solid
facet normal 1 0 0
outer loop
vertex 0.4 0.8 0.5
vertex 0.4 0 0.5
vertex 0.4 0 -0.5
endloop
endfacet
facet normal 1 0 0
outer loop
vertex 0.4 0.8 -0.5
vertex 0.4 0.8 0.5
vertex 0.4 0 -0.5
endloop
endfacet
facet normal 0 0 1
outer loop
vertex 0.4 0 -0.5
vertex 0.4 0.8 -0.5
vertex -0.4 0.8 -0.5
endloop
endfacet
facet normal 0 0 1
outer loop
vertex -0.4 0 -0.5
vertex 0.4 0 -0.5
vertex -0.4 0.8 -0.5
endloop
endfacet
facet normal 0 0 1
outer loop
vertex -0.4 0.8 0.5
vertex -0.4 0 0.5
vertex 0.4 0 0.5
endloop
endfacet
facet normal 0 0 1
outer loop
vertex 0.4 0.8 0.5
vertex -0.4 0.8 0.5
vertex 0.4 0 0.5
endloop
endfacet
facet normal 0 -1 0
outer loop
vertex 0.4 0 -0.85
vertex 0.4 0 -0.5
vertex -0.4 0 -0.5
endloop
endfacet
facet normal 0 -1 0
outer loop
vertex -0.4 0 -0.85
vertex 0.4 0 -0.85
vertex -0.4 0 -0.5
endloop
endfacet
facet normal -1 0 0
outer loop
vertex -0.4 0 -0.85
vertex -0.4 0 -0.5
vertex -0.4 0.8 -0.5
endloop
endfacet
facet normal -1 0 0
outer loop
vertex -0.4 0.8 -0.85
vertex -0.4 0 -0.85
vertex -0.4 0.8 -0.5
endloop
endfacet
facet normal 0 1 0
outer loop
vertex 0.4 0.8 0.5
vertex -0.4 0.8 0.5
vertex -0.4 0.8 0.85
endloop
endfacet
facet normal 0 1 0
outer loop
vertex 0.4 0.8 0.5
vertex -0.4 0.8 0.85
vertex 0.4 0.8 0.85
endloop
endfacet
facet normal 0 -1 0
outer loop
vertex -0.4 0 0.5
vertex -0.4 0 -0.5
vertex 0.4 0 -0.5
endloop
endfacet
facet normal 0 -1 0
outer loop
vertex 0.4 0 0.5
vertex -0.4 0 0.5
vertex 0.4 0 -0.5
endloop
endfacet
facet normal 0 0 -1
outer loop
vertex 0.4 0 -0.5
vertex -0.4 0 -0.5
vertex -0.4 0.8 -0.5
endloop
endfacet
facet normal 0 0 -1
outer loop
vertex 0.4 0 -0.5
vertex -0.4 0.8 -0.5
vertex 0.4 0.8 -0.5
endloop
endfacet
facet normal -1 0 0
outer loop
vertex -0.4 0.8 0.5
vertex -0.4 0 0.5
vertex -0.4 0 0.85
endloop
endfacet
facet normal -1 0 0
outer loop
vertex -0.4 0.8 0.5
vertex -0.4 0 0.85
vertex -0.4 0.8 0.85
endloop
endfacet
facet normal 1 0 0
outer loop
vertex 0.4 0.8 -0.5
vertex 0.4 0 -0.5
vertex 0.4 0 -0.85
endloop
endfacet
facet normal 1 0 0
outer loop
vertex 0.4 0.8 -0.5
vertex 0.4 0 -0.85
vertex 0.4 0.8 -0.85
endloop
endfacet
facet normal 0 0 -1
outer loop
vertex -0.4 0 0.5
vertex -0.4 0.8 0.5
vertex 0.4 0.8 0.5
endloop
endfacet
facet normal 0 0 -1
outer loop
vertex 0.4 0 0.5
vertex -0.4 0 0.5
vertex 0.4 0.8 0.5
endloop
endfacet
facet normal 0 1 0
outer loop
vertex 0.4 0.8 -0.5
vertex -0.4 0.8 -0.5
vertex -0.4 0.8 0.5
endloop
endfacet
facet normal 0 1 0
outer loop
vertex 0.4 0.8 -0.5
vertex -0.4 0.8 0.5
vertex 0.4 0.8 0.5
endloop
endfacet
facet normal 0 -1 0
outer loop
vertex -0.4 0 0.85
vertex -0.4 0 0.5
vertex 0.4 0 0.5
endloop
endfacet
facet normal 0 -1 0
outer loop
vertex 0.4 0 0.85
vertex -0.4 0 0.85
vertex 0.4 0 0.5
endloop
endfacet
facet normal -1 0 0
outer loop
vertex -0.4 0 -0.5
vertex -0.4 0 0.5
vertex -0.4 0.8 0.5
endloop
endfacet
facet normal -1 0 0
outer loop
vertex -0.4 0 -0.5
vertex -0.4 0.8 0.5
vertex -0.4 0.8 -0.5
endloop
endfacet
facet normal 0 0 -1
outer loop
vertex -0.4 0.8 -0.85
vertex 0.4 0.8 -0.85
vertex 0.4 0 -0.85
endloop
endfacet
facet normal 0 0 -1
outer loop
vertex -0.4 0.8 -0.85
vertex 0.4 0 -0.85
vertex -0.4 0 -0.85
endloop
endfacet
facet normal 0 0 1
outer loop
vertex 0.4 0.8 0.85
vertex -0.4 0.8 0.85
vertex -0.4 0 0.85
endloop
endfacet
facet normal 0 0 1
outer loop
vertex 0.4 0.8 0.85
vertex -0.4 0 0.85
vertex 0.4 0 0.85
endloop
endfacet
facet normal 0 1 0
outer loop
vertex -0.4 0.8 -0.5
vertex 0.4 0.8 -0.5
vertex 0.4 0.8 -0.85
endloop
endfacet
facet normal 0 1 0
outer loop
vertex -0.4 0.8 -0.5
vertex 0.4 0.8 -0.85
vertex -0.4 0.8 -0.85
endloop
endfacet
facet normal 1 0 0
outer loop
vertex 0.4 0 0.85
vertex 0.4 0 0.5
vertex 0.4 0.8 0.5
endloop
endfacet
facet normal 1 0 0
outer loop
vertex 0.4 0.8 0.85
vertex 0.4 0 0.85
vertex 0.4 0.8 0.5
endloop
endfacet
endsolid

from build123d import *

# Parameters (mm, degrees)
SKETCH1_W  = 0.8
SKETCH1_H  = 1
MB_DEPTH   = 0.8
SKETCH2_W  = 0.8
SKETCH2_H  = 0.8
SB_L_DEPTH = 0.35
SKETCH3_W  = 0.8
SKETCH3_H  = 0.8
SB_R_DEPTH = 0.35


with BuildPart() as part:
    # Sketch1 → MB (new body)
    with BuildSketch(Plane(origin=(0, 0, 0), x_dir=(1, 0, 0), z_dir=(0, 1, 0))):
        Rectangle(SKETCH1_W, SKETCH1_H)
    extrude(amount=MB_DEPTH)


with BuildPart() as body_2:
    # Sketch2 → SB L (new body)
    with BuildSketch(Plane.XY.offset(0.5)):
        with Locations((0, 0.4)):
            Rectangle(SKETCH2_W, SKETCH2_H)
    extrude(amount=SB_L_DEPTH)


with BuildPart() as body_3:
    # Sketch3 → SB R (new body)
    with BuildSketch(Plane(origin=(0, 0, -0.5), x_dir=(-1, 0, 0), z_dir=(0, 0, -1))):
        with Locations((0, 0.4)):
            Rectangle(SKETCH3_W, SKETCH3_H)
    extrude(amount=SB_R_DEPTH)


solid = Compound([part.part, body_2.part, body_3.part])
